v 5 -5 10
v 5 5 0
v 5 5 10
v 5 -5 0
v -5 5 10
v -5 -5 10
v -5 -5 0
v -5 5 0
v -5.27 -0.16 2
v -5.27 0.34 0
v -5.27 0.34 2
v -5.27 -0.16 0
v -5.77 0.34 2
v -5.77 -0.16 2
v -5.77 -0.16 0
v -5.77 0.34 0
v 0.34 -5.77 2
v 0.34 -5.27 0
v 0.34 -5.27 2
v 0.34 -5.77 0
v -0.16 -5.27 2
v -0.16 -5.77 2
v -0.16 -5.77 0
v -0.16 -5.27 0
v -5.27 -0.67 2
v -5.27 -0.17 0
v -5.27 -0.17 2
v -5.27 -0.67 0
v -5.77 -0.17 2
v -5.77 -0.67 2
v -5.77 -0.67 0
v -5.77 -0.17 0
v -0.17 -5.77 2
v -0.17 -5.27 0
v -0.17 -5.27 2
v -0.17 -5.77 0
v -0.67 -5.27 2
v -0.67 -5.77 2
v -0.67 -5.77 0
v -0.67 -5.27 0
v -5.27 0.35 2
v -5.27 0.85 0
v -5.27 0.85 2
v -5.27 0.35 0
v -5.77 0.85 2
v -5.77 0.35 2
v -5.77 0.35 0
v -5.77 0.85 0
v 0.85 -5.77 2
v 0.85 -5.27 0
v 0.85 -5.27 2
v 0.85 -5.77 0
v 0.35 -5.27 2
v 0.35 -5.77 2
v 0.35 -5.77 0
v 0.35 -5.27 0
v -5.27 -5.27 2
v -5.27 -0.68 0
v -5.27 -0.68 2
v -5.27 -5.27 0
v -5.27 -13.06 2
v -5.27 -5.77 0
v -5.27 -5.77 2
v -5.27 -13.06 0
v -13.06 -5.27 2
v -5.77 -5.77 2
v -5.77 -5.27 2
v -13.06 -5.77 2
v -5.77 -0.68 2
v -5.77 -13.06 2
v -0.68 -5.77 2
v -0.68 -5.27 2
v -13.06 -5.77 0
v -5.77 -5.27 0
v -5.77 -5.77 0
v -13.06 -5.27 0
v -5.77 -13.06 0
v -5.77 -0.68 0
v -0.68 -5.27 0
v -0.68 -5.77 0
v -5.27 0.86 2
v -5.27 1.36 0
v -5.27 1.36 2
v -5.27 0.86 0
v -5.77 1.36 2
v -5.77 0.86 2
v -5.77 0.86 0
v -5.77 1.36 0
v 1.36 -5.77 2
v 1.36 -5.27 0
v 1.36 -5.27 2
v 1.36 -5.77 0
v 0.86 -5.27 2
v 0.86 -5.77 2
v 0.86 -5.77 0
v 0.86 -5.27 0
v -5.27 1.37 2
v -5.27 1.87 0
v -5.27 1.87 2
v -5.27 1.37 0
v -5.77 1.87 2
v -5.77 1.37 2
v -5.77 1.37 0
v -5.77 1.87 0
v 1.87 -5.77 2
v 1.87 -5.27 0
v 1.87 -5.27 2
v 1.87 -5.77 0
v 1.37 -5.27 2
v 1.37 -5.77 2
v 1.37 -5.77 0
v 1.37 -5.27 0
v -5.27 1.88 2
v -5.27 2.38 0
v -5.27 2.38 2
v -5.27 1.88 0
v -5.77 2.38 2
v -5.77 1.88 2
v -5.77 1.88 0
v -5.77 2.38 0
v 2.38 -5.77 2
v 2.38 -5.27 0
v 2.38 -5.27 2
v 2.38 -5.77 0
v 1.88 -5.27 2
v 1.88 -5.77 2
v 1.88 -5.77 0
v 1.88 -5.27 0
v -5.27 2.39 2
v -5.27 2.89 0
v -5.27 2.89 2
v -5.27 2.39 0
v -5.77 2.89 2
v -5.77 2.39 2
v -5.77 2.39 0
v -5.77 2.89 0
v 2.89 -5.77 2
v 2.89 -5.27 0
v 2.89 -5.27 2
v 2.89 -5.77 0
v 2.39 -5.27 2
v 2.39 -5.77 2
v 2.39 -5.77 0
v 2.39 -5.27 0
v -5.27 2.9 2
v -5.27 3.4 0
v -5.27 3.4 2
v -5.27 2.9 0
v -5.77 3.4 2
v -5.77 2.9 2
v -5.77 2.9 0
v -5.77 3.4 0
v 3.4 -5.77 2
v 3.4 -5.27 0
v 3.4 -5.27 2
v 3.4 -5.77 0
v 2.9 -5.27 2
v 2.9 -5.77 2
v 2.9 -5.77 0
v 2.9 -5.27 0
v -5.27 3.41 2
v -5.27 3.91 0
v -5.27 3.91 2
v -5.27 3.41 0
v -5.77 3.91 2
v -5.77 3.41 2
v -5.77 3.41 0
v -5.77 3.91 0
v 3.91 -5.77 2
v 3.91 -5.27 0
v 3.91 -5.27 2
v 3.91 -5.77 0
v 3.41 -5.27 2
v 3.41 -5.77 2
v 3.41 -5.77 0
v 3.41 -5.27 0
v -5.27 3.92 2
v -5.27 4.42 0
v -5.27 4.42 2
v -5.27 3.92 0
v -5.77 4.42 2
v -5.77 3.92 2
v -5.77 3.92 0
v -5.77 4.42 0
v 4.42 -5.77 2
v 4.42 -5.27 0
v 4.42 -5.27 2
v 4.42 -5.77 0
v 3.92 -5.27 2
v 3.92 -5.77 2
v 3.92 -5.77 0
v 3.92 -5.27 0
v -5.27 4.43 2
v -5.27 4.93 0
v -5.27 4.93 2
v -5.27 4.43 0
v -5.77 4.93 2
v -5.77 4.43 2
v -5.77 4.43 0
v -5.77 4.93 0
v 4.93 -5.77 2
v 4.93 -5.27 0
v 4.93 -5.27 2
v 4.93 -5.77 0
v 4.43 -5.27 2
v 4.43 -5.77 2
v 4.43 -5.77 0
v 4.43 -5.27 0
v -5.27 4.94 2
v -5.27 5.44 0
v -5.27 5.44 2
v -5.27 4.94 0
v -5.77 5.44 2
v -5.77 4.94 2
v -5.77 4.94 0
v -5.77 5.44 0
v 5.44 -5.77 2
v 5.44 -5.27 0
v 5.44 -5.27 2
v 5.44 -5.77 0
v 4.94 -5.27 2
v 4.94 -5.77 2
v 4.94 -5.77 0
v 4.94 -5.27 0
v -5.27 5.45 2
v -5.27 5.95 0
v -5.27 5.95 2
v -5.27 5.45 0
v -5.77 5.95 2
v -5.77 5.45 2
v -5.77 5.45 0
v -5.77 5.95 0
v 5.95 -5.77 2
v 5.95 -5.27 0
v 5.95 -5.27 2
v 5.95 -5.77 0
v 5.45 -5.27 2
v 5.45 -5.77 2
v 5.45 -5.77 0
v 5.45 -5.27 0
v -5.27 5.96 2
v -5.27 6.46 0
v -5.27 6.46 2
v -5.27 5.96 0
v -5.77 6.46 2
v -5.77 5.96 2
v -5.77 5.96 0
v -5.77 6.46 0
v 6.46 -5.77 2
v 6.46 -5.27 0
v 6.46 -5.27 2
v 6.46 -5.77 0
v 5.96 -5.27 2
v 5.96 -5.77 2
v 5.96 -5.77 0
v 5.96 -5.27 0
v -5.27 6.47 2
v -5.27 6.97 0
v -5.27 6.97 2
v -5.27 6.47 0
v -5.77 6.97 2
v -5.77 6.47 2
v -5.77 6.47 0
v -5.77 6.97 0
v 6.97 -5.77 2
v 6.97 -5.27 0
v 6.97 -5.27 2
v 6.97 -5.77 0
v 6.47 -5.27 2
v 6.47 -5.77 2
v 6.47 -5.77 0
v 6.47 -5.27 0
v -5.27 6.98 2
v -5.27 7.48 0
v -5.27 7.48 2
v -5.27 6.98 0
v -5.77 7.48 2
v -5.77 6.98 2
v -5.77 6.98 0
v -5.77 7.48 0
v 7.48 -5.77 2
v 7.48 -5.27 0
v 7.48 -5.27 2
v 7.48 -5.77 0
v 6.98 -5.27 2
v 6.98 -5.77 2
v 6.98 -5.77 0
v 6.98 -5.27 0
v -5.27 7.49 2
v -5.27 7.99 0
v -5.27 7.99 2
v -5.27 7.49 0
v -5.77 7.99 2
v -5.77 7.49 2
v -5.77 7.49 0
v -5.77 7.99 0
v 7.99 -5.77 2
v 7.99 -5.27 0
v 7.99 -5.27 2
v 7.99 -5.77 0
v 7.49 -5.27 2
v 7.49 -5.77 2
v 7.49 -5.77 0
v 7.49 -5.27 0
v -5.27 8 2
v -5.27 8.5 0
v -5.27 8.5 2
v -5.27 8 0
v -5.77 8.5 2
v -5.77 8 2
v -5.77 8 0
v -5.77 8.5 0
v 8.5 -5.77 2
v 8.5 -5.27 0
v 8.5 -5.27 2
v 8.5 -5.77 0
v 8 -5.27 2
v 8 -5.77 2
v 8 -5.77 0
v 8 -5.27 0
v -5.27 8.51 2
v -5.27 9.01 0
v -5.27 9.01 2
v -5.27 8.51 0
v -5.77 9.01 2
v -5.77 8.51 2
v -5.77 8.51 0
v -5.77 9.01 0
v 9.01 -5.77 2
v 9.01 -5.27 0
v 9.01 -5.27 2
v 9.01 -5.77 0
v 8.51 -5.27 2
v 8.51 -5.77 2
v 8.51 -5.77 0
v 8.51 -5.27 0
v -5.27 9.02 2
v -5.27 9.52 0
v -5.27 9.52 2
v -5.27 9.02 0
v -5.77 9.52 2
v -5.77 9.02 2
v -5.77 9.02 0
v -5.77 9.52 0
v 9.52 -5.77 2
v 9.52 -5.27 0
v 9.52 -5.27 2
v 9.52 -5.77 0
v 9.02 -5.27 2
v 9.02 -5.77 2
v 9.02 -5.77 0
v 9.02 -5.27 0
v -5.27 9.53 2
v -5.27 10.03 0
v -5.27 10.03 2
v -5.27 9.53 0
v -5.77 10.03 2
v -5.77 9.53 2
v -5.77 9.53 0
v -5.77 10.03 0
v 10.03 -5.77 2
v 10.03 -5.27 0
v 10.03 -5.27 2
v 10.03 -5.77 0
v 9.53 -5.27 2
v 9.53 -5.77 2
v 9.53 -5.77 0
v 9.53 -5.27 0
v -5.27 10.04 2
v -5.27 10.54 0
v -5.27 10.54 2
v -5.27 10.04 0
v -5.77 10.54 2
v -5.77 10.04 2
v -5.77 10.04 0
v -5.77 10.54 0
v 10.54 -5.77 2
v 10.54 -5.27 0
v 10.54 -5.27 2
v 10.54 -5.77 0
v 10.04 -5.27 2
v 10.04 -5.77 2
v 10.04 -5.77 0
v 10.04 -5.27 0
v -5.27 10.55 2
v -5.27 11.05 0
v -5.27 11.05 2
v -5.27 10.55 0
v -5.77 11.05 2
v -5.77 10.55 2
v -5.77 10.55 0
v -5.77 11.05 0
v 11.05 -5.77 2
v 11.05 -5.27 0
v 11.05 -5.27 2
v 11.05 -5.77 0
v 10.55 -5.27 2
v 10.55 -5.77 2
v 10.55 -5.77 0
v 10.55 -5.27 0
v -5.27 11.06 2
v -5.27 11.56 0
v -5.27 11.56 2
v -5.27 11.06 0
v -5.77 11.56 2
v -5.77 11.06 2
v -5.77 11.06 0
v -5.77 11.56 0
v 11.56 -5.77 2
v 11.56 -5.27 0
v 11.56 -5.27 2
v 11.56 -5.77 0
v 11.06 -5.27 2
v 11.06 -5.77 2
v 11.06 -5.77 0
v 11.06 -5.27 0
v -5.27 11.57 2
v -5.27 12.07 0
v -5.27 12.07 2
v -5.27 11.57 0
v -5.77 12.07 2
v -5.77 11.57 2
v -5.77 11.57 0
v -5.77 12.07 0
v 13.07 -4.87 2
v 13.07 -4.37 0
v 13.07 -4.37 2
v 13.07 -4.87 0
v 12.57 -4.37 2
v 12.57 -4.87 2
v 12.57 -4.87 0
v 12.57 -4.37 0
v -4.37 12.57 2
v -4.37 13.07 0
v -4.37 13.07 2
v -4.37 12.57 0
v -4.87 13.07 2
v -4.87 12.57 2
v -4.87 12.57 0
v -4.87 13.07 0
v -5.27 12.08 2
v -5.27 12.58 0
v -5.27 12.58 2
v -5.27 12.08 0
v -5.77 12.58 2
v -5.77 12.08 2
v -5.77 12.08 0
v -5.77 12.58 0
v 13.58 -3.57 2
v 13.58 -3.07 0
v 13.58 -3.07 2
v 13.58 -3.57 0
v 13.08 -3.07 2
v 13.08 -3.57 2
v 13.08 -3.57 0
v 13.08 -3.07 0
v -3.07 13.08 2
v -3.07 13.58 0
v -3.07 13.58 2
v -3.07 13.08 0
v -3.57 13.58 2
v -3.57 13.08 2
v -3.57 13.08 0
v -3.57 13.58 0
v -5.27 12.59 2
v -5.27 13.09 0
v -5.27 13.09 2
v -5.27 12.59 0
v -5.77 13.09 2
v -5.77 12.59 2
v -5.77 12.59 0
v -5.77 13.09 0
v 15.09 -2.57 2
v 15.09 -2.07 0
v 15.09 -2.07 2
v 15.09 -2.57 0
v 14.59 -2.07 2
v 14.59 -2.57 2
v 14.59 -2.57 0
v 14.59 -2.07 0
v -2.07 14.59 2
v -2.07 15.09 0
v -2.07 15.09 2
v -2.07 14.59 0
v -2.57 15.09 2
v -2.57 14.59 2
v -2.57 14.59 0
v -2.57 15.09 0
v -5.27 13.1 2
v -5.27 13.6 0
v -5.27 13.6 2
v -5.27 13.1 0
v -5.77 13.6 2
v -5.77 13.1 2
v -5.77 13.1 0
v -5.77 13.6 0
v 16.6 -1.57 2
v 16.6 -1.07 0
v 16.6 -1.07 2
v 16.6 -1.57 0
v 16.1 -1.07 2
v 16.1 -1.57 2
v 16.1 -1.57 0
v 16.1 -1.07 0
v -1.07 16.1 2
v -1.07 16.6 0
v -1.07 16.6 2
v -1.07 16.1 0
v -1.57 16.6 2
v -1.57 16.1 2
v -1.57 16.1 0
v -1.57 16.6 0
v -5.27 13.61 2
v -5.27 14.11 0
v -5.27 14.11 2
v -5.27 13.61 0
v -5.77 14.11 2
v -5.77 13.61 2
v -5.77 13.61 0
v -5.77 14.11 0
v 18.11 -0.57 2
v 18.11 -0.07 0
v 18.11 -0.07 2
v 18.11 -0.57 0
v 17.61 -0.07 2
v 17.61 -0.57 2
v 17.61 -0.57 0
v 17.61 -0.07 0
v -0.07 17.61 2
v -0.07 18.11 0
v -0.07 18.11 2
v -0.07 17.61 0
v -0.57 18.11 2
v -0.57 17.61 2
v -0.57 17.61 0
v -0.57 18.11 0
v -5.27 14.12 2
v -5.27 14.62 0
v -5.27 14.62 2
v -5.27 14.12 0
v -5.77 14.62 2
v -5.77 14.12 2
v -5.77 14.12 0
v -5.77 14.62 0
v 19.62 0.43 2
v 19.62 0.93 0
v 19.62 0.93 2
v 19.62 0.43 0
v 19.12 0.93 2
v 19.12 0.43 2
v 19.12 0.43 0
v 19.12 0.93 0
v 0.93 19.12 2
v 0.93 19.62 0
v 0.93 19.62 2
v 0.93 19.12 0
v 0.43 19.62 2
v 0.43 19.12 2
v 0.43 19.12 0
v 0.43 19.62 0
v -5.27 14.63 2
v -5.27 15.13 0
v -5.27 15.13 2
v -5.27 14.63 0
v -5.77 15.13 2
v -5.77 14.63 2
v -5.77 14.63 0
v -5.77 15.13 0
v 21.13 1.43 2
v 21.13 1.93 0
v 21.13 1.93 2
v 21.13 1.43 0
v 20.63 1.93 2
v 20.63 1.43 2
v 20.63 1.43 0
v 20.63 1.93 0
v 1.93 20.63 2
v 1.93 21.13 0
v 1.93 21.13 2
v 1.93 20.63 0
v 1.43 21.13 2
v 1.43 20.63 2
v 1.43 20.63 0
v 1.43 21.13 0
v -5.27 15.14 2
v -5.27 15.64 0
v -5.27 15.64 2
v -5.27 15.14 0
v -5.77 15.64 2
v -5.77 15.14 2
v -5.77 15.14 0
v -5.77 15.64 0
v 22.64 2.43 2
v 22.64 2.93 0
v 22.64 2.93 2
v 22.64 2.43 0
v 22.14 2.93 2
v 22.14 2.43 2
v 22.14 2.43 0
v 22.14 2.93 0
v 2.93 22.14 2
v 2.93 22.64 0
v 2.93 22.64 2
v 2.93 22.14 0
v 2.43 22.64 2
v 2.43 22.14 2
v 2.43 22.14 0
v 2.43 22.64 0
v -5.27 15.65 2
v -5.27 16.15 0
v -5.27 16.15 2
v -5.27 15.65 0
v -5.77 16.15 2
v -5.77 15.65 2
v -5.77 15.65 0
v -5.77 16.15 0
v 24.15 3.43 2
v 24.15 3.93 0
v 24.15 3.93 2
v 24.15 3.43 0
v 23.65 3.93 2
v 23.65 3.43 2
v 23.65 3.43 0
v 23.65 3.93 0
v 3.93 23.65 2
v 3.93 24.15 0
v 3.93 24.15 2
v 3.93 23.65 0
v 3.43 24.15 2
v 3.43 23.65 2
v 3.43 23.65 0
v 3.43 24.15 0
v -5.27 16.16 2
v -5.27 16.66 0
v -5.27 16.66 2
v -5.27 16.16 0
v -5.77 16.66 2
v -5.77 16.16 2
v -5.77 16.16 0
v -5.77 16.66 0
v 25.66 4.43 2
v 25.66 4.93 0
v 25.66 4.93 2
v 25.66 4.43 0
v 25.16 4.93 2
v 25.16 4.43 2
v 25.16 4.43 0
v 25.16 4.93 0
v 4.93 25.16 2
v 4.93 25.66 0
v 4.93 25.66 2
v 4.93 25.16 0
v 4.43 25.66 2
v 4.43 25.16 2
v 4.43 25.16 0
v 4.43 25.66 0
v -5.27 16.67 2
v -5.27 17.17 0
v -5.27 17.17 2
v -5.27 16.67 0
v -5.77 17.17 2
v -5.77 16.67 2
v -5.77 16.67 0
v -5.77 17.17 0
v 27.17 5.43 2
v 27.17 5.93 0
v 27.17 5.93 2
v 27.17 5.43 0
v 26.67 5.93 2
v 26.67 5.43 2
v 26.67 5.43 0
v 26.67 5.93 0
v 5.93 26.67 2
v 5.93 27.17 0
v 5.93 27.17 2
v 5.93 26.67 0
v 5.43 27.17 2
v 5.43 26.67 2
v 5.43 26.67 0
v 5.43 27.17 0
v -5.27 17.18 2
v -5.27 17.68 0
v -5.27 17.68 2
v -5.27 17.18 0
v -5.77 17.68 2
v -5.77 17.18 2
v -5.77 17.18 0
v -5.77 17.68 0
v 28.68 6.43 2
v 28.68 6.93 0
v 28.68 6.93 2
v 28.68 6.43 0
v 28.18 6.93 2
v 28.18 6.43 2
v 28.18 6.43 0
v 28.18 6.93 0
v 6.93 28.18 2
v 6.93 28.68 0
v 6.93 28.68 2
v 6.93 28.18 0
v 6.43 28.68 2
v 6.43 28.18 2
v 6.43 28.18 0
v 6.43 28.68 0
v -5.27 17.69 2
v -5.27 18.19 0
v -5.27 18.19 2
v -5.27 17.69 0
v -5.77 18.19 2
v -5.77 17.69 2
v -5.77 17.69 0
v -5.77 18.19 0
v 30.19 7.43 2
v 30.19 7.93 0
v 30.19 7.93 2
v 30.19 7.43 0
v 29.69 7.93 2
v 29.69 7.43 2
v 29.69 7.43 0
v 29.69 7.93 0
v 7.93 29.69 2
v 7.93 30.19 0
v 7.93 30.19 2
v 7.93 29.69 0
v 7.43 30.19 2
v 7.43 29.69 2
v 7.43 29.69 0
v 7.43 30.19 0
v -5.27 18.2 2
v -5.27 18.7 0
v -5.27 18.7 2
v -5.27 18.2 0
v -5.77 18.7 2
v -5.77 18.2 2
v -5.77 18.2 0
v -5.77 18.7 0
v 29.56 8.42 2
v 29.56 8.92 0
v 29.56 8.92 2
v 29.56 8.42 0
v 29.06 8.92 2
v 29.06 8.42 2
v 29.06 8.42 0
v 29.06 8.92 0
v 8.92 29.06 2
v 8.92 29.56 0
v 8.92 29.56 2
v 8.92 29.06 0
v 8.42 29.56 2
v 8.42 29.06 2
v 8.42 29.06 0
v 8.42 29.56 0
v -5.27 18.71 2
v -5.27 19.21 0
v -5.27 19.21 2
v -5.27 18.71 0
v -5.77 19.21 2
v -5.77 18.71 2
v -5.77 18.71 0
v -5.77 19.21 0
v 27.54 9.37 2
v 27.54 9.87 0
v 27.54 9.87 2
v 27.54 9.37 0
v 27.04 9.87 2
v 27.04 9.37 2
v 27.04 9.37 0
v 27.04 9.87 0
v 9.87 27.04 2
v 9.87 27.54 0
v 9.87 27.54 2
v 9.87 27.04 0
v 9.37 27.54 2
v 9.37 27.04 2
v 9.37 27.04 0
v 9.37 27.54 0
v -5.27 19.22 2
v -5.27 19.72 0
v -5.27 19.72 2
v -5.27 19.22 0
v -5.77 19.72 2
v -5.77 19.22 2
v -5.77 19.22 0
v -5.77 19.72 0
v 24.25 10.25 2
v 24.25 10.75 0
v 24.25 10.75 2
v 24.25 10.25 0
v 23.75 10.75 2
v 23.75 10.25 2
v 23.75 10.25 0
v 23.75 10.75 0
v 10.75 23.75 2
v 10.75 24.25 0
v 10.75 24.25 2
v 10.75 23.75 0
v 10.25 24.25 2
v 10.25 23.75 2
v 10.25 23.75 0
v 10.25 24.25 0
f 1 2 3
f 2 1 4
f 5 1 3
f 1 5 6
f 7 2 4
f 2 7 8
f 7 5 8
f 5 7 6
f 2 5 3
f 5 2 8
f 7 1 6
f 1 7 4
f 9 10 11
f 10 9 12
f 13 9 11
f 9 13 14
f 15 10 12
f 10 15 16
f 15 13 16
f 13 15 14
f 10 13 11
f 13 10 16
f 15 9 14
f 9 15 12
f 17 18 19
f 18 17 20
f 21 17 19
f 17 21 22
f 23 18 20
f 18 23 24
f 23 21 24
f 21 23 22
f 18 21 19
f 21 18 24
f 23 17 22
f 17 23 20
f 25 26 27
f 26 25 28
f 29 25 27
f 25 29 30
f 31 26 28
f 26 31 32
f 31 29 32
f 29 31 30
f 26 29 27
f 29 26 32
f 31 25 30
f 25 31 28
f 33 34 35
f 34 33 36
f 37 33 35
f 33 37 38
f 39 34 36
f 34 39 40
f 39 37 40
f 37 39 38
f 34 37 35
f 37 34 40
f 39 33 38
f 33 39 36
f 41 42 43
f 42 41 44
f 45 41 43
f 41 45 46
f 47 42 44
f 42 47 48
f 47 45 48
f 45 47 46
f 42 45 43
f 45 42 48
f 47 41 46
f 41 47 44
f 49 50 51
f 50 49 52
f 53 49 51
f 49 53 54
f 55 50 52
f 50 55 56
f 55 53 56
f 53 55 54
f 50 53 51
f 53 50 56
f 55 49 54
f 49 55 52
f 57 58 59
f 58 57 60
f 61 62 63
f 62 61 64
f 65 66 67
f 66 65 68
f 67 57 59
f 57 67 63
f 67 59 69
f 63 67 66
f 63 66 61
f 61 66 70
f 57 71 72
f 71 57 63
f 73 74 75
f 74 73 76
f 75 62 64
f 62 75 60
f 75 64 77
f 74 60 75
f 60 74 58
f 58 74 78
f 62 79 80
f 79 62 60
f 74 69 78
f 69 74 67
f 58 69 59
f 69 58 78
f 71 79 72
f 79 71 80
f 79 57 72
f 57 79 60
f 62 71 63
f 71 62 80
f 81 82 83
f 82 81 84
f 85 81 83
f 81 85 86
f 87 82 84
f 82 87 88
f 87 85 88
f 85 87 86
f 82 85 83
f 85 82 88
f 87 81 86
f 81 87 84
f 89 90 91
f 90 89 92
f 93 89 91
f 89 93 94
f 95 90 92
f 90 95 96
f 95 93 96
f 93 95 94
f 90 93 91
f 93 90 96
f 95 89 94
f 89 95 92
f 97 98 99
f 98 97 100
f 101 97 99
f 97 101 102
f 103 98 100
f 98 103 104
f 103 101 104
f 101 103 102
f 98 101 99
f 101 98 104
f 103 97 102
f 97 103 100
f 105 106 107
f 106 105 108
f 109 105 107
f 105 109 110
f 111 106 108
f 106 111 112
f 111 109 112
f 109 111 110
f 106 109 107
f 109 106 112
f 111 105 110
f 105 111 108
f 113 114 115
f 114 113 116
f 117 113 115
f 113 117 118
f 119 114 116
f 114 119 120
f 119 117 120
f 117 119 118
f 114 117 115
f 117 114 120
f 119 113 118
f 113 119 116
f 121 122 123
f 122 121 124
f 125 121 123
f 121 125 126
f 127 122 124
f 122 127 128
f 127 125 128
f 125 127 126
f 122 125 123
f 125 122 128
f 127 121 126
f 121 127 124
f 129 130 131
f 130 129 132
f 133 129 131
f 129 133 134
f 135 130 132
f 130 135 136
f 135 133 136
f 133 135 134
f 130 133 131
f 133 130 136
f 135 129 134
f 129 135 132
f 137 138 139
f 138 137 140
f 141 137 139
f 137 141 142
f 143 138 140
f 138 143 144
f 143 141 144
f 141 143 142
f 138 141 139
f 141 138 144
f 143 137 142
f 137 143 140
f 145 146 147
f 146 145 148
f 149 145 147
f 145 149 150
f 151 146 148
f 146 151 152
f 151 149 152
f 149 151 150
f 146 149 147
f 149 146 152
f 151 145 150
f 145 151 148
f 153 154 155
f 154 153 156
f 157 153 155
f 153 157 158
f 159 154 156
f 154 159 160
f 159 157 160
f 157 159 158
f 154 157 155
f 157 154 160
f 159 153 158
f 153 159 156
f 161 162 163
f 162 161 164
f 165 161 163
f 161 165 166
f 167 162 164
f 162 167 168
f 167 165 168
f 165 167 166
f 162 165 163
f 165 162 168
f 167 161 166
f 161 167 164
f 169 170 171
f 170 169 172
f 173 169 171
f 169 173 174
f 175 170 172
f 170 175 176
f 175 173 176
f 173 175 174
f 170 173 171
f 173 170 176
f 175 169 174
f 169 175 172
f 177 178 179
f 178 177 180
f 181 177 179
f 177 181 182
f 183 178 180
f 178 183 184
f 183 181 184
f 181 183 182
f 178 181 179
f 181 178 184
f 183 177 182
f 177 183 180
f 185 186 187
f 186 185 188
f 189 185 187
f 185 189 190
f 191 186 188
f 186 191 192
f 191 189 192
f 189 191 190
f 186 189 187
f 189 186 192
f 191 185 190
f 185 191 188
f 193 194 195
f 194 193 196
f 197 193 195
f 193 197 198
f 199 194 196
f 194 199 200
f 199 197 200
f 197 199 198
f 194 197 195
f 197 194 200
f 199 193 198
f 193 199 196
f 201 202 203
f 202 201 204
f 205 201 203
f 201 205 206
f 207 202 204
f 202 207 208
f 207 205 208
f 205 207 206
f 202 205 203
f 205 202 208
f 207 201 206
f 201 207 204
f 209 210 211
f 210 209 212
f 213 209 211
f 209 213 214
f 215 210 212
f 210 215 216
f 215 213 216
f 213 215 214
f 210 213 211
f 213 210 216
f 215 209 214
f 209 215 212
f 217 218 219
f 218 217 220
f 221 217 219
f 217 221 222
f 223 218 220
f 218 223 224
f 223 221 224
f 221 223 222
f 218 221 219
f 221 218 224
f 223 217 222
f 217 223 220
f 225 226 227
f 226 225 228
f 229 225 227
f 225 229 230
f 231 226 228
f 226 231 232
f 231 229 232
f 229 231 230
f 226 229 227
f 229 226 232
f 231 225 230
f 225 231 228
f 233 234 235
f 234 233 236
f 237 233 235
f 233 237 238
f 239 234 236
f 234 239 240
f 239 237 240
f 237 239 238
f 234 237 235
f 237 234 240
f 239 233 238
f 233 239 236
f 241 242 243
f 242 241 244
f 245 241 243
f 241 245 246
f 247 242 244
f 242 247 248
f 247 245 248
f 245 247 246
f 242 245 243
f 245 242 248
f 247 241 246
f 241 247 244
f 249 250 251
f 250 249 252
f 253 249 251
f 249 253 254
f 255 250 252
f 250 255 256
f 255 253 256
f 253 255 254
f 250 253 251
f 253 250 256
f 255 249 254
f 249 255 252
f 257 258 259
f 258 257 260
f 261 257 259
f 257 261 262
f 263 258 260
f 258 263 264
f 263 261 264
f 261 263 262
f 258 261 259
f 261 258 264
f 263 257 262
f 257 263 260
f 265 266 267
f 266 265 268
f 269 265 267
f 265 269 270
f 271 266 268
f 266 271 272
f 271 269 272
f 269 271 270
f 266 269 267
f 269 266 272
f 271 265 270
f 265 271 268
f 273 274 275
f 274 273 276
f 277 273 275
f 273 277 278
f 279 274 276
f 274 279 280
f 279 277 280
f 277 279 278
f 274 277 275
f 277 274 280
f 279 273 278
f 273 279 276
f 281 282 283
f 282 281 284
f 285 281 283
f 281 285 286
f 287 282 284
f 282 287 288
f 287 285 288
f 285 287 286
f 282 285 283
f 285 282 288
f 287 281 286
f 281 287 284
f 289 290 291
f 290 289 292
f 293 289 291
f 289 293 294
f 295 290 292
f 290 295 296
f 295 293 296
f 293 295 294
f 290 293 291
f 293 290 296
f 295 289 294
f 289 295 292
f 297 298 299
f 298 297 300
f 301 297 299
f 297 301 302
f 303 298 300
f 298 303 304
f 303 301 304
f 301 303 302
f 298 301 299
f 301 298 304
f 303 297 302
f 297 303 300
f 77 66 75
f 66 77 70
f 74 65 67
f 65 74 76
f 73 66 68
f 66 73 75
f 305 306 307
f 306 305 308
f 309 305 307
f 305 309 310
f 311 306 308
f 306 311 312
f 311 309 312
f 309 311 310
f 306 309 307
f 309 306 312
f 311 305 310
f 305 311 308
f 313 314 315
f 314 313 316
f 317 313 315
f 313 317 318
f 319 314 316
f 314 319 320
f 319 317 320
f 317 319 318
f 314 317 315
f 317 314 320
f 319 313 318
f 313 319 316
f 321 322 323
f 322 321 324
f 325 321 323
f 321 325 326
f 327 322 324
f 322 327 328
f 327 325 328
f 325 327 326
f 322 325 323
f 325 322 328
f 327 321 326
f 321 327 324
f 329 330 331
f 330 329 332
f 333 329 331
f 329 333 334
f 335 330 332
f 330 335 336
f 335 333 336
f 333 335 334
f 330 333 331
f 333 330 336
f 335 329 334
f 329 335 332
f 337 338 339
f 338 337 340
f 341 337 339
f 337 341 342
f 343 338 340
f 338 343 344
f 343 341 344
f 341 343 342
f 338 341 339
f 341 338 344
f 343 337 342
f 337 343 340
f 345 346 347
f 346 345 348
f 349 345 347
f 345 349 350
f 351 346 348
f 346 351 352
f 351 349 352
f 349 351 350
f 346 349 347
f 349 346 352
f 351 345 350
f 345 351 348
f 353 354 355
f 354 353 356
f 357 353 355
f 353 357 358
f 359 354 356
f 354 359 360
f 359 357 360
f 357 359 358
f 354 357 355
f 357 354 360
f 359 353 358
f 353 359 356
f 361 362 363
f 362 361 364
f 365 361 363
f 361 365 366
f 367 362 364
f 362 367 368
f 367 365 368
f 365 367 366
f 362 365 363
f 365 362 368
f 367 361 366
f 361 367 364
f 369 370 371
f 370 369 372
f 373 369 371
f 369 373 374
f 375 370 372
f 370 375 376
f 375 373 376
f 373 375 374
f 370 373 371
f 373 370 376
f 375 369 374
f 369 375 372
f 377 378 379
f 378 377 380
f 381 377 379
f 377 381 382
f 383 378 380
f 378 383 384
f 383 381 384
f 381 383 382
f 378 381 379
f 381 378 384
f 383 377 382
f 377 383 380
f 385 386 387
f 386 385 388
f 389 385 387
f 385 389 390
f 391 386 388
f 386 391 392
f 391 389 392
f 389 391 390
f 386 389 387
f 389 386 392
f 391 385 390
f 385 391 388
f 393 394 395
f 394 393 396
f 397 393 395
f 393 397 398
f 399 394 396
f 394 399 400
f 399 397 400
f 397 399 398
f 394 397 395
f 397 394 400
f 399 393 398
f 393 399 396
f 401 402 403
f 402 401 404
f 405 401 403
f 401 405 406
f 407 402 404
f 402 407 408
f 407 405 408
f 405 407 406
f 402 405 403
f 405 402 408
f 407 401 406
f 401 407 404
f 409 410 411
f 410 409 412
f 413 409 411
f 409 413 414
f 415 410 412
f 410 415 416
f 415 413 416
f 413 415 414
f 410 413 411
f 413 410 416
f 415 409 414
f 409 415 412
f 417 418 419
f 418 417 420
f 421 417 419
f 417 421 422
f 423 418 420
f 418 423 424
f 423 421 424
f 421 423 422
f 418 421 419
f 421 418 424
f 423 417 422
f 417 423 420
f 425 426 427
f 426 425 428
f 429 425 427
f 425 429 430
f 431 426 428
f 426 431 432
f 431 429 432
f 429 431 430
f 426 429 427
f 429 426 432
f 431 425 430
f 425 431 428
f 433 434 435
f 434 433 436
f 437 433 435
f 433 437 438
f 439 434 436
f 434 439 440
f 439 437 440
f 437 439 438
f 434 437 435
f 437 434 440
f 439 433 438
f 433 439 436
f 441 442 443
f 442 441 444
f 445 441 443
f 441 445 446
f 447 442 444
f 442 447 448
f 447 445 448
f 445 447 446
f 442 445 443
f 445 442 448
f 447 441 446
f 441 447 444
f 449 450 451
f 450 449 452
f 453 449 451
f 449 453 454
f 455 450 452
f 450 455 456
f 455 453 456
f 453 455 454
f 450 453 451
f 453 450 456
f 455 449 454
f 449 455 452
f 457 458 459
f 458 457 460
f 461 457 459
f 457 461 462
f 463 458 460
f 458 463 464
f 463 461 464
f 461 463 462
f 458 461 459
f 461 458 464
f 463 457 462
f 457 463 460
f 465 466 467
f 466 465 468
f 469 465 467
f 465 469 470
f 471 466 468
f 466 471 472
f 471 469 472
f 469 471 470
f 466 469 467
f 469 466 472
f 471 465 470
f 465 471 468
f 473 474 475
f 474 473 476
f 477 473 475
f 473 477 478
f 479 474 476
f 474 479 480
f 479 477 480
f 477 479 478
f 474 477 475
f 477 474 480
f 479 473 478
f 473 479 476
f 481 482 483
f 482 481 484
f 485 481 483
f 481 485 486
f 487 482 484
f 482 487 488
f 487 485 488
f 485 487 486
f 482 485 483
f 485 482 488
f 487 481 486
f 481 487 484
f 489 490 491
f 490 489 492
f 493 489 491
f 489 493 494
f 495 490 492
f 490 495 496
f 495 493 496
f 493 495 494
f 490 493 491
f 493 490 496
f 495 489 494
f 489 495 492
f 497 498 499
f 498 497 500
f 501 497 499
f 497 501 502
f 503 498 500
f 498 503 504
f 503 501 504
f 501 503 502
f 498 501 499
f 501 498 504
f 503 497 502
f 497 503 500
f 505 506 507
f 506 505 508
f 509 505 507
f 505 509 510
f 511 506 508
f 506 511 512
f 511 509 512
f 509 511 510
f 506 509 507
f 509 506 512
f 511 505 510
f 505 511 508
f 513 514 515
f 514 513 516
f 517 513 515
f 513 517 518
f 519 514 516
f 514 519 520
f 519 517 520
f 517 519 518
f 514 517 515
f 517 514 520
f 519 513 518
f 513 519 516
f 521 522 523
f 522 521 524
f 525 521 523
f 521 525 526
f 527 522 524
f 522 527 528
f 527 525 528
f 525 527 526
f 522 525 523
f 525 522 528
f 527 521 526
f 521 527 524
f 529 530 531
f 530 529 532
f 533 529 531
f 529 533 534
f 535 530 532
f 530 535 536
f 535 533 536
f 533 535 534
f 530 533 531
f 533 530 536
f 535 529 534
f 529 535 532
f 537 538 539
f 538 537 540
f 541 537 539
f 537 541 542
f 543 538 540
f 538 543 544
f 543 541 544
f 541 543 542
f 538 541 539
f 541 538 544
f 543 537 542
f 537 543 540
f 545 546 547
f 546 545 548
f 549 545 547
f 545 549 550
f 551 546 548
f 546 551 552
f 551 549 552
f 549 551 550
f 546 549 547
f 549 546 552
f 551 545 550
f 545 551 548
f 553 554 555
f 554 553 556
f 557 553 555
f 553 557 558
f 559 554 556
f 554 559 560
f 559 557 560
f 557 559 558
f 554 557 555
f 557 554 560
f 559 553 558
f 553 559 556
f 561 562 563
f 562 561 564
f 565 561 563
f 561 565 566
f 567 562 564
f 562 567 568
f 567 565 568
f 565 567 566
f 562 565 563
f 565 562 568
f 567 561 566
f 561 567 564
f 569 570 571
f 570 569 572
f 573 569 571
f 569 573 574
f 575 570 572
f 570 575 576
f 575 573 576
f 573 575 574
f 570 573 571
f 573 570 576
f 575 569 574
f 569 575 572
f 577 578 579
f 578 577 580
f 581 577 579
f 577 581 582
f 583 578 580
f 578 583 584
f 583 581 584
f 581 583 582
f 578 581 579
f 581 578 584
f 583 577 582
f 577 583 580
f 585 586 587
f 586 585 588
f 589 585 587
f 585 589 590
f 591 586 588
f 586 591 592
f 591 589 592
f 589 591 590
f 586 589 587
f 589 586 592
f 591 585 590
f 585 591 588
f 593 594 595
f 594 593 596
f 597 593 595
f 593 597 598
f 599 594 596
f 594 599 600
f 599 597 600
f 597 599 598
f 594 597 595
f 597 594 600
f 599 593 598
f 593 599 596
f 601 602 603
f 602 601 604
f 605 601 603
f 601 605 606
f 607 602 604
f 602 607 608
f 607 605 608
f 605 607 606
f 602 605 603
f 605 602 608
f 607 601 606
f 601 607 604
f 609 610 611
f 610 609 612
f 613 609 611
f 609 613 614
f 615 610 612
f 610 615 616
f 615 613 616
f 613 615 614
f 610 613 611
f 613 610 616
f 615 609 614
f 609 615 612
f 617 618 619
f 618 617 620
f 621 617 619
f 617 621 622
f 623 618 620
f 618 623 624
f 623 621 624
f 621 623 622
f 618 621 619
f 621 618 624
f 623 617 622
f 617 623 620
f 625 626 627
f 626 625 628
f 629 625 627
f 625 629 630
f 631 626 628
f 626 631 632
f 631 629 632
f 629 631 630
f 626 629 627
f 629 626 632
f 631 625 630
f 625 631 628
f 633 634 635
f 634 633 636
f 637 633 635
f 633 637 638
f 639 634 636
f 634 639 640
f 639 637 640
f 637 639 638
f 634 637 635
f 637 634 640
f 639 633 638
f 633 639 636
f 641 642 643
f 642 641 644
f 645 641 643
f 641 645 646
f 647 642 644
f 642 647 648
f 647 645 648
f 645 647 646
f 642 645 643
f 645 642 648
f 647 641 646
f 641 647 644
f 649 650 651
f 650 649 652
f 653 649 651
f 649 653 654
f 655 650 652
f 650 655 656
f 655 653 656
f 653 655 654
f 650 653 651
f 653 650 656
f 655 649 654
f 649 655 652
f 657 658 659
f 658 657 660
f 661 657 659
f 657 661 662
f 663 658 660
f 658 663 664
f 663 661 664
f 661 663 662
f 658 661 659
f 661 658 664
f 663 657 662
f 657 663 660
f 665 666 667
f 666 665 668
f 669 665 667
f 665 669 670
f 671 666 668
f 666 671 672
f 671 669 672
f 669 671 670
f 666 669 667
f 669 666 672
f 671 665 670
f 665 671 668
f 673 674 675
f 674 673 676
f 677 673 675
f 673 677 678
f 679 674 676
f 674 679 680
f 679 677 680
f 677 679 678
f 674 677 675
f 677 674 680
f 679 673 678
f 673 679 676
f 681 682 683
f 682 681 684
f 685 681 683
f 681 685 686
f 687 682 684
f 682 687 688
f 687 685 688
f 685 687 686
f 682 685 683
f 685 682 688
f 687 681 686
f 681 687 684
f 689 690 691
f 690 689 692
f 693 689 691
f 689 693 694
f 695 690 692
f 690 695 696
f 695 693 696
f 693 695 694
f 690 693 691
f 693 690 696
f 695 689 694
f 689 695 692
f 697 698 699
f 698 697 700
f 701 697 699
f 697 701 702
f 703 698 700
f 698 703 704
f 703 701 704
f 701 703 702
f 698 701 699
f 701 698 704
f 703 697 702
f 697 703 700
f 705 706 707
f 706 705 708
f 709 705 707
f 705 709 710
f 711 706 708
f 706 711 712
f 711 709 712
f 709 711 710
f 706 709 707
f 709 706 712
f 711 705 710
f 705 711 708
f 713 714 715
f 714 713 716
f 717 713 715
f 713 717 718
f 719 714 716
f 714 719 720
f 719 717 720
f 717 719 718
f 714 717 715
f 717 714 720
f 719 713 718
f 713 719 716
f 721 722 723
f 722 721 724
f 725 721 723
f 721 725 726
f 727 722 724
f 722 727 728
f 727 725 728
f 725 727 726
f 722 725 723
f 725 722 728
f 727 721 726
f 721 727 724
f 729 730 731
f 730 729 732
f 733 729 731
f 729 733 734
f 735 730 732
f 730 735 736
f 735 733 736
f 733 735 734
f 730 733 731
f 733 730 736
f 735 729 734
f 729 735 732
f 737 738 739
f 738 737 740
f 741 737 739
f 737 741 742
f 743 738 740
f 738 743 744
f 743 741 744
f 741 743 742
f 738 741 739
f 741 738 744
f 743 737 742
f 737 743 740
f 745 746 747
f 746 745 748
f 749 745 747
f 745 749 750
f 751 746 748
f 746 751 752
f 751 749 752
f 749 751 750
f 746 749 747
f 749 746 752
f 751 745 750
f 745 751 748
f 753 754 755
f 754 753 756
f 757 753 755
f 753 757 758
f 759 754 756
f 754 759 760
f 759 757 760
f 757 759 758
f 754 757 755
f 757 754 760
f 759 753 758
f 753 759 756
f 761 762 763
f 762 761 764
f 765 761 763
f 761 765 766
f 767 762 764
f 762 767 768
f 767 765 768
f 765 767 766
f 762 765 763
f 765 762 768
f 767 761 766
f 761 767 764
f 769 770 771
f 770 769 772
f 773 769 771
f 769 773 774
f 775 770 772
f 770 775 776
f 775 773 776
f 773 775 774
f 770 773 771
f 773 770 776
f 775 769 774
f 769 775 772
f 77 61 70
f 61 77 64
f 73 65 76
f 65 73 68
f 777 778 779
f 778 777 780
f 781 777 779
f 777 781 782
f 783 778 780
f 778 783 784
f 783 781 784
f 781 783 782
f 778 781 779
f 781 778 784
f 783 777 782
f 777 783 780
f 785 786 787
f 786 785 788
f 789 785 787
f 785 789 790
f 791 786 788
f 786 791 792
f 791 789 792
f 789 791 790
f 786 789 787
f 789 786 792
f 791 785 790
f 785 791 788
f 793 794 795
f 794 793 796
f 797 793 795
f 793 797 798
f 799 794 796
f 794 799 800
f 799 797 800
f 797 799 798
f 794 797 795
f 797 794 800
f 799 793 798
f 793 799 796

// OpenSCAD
translate([0, 0, 5]) color([0,1,0,0.9]) cube([10, 10, 10], center=true);
translate([-5.52, 0.09, 1]) color([1,0,0]) cube([0.5, 0.5, 2], center=true);
translate([0.09, -5.52, 1]) color([1,0,0]) cube([0.5, 0.5, 2], center=true);
translate([-5.52, -0.42, 1]) color([1,0,0]) cube([0.5, 0.5, 2], center=true);
translate([-0.42, -5.52, 1]) color([1,0,0]) cube([0.5, 0.5, 2], center=true);
translate([-5.52, 0.6, 1]) color([1,0,0]) cube([0.5, 0.5, 2], center=true);
translate([0.6, -5.52, 1]) color([1,0,0]) cube([0.5, 0.5, 2], center=true);
translate([-5.52, -0.93, 1]) color([1,0,0]) cube([0.5, 0.5, 2], center=true);
translate([-0.93, -5.52, 1]) color([1,0,0]) cube([0.5, 0.5, 2], center=true);
translate([-5.52, 1.11, 1]) color([1,0,0]) cube([0.5, 0.5, 2], center=true);
translate([1.11, -5.52, 1]) color([1,0,0]) cube([0.5, 0.5, 2], center=true);
translate([-5.52, -1.26, 1]) color([1,0,0]) cube([0.5, 0.5, 2], center=true);
translate([-1.26, -5.52, 1]) color([1,0,0]) cube([0.5, 0.5, 2], center=true);
translate([-5.52, 1.62, 1]) color([1,0,0]) cube([0.5, 0.5, 2], center=true);
translate([1.62, -5.52, 1]) color([1,0,0]) cube([0.5, 0.5, 2], center=true);
translate([-5.52, -1.59, 1]) color([1,0,0]) cube([0.5, 0.5, 2], center=true);
translate([-1.59, -5.52, 1]) color([1,0,0]) cube([0.5, 0.5, 2], center=true);
translate([-5.52, 2.13, 1]) color([1,0,0]) cube([0.5, 0.5, 2], center=true);
translate([2.13, -5.52, 1]) color([1,0,0]) cube([0.5, 0.5, 2], center=true);
translate([-5.52, -1.92, 1]) color([1,0,0]) cube([0.5, 0.5, 2], center=true);
translate([-1.92, -5.52, 1]) color([1,0,0]) cube([0.5, 0.5, 2], center=true);
translate([-5.52, 2.64, 1]) color([1,0,0]) cube([0.5, 0.5, 2], center=true);
translate([2.64, -5.52, 1]) color([1,0,0]) cube([0.5, 0.5, 2], center=true);
translate([-5.52, -2.25, 1]) color([1,0,0]) cube([0.5, 0.5, 2], center=true);
translate([-2.25, -5.52, 1]) color([1,0,0]) cube([0.5, 0.5, 2], center=true);
translate([-5.52, 3.15, 1]) color([1,0,0]) cube([0.5, 0.5, 2], center=true);
translate([3.15, -5.52, 1]) color([1,0,0]) cube([0.5, 0.5, 2], center=true);
translate([-5.52, -2.58, 1]) color([1,0,0]) cube([0.5, 0.5, 2], center=true);
translate([-2.58, -5.52, 1]) color([1,0,0]) cube([0.5, 0.5, 2], center=true);
translate([-5.52, 3.66, 1]) color([1,0,0]) cube([0.5, 0.5, 2], center=true);
translate([3.66, -5.52, 1]) color([1,0,0]) cube([0.5, 0.5, 2], center=true);
translate([-5.52, -2.91, 1]) color([1,0,0]) cube([0.5, 0.5, 2], center=true);
translate([-2.91, -5.52, 1]) color([1,0,0]) cube([0.5, 0.5, 2], center=true);
translate([-5.52, 4.17, 1]) color([1,0,0]) cube([0.5, 0.5, 2], center=true);
translate([4.17, -5.52, 1]) color([1,0,0]) cube([0.5, 0.5, 2], center=true);
translate([-5.52, -3.24, 1]) color([1,0,0]) cube([0.5, 0.5, 2], center=true);
translate([-3.24, -5.52, 1]) color([1,0,0]) cube([0.5, 0.5, 2], center=true);
translate([-5.52, 4.68, 1]) color([1,0,0]) cube([0.5, 0.5, 2], center=true);
translate([4.68, -5.52, 1]) color([1,0,0]) cube([0.5, 0.5, 2], center=true);
translate([-5.52, -3.57, 1]) color([1,0,0]) cube([0.5, 0.5, 2], center=true);
translate([-3.57, -5.52, 1]) color([1,0,0]) cube([0.5, 0.5, 2], center=true);
translate([-5.52, 5.19, 1]) color([1,0,0]) cube([0.5, 0.5, 2], center=true);
translate([5.19, -5.52, 1]) color([1,0,0]) cube([0.5, 0.5, 2], center=true);
translate([-5.52, -3.9, 1]) color([1,0,0]) cube([0.5, 0.5, 2], center=true);
translate([-3.9, -5.52, 1]) color([1,0,0]) cube([0.5, 0.5, 2], center=true);
translate([-5.52, 5.7, 1]) color([1,0,0]) cube([0.5, 0.5, 2], center=true);
translate([5.7, -5.52, 1]) color([1,0,0]) cube([0.5, 0.5, 2], center=true);
translate([-5.52, -4.23, 1]) color([1,0,0]) cube([0.5, 0.5, 2], center=true);
translate([-4.23, -5.52, 1]) color([1,0,0]) cube([0.5, 0.5, 2], center=true);
translate([-5.52, 6.21, 1]) color([1,0,0]) cube([0.5, 0.5, 2], center=true);
translate([6.21, -5.52, 1]) color([1,0,0]) cube([0.5, 0.5, 2], center=true);
translate([-5.52, -4.56, 1]) color([1,0,0]) cube([0.5, 0.5, 2], center=true);
translate([-4.56, -5.52, 1]) color([1,0,0]) cube([0.5, 0.5, 2], center=true);
translate([-5.52, 6.72, 1]) color([1,0,0]) cube([0.5, 0.5, 2], center=true);
translate([6.72, -5.52, 1]) color([1,0,0]) cube([0.5, 0.5, 2], center=true);
translate([-5.52, -4.89, 1]) color([1,0,0]) cube([0.5, 0.5, 2], center=true);
translate([-4.89, -5.52, 1]) color([1,0,0]) cube([0.5, 0.5, 2], center=true);
translate([-5.52, 7.23, 1]) color([1,0,0]) cube([0.5, 0.5, 2], center=true);
translate([7.23, -5.52, 1]) color([1,0,0]) cube([0.5, 0.5, 2], center=true);
translate([-5.52, -5.22, 1]) color([1,0,0]) cube([0.5, 0.5, 2], center=true);
translate([-5.22, -5.52, 1]) color([1,0,0]) cube([0.5, 0.5, 2], center=true);
translate([-5.52, 7.74, 1]) color([1,0,0]) cube([0.5, 0.5, 2], center=true);
translate([7.74, -5.52, 1]) color([1,0,0]) cube([0.5, 0.5, 2], center=true);
translate([-5.52, -5.55, 1]) color([1,0,0]) cube([0.5, 0.5, 2], center=true);
translate([-5.55, -5.52, 1]) color([1,0,0]) cube([0.5, 0.5, 2], center=true);
translate([-5.52, 8.25, 1]) color([1,0,0]) cube([0.5, 0.5, 2], center=true);
translate([8.25, -5.52, 1]) color([1,0,0]) cube([0.5, 0.5, 2], center=true);
translate([-5.52, -5.88, 1]) color([1,0,0]) cube([0.5, 0.5, 2], center=true);
translate([-5.88, -5.52, 1]) color([1,0,0]) cube([0.5, 0.5, 2], center=true);
translate([-5.52, 8.76, 1]) color([1,0,0]) cube([0.5, 0.5, 2], center=true);
translate([8.76, -5.52, 1]) color([1,0,0]) cube([0.5, 0.5, 2], center=true);
translate([-5.52, -6.21, 1]) color([1,0,0]) cube([0.5, 0.5, 2], center=true);
translate([-6.21, -5.52, 1]) color([1,0,0]) cube([0.5, 0.5, 2], center=true);
translate([-5.52, 9.27, 1]) color([1,0,0]) cube([0.5, 0.5, 2], center=true);
translate([9.27, -5.52, 1]) color([1,0,0]) cube([0.5, 0.5, 2], center=true);
translate([-5.52, -6.54, 1]) color([1,0,0]) cube([0.5, 0.5, 2], center=true);
translate([-6.54, -5.52, 1]) color([1,0,0]) cube([0.5, 0.5, 2], center=true);
translate([-5.52, 9.78, 1]) color([1,0,0]) cube([0.5, 0.5, 2], center=true);
translate([9.78, -5.52, 1]) color([1,0,0]) cube([0.5, 0.5, 2], center=true);
translate([-5.52, -6.87, 1]) color([1,0,0]) cube([0.5, 0.5, 2], center=true);
translate([-6.87, -5.52, 1]) color([1,0,0]) cube([0.5, 0.5, 2], center=true);
translate([-5.52, 10.29, 1]) color([1,0,0]) cube([0.5, 0.5, 2], center=true);
translate([10.29, -5.52, 1]) color([1,0,0]) cube([0.5, 0.5, 2], center=true);
translate([-5.52, -7.2, 1]) color([1,0,0]) cube([0.5, 0.5, 2], center=true);
translate([-7.2, -5.52, 1]) color([1,0,0]) cube([0.5, 0.5, 2], center=true);
translate([-5.52, 10.8, 1]) color([1,0,0]) cube([0.5, 0.5, 2], center=true);
translate([10.8, -5.52, 1]) color([1,0,0]) cube([0.5, 0.5, 2], center=true);
translate([-5.52, -7.53, 1]) color([1,0,0]) cube([0.5, 0.5, 2], center=true);
translate([-7.53, -5.52, 1]) color([1,0,0]) cube([0.5, 0.5, 2], center=true);
translate([-5.52, 11.31, 1]) color([1,0,0]) cube([0.5, 0.5, 2], center=true);
translate([11.31, -5.52, 1]) color([1,0,0]) cube([0.5, 0.5, 2], center=true);
translate([-5.52, -7.86, 1]) color([1,0,0]) cube([0.5, 0.5, 2], center=true);
translate([-7.86, -5.52, 1]) color([1,0,0]) cube([0.5, 0.5, 2], center=true);
translate([-5.52, 11.82, 1]) color([1,0,0]) cube([0.5, 0.5, 2], center=true);
translate([12.82, -4.62, 1]) color([1,0,0]) cube([0.5, 0.5, 2], center=true);
translate([-4.62, 12.82, 1]) color([1,0,0]) cube([0.5, 0.5, 2], center=true);
translate([-5.52, -8.19, 1]) color([1,0,0]) cube([0.5, 0.5, 2], center=true);
translate([-8.19, -5.52, 1]) color([1,0,0]) cube([0.5, 0.5, 2], center=true);
translate([-5.52, 12.33, 1]) color([1,0,0]) cube([0.5, 0.5, 2], center=true);
translate([13.33, -3.32, 1]) color([1,0,0]) cube([0.5, 0.5, 2], center=true);
translate([-3.32, 13.33, 1]) color([1,0,0]) cube([0.5, 0.5, 2], center=true);
translate([-5.52, -8.52, 1]) color([1,0,0]) cube([0.5, 0.5, 2], center=true);
translate([-8.52, -5.52, 1]) color([1,0,0]) cube([0.5, 0.5, 2], center=true);
translate([-5.52, 12.84, 1]) color([1,0,0]) cube([0.5, 0.5, 2], center=true);
translate([14.84, -2.32, 1]) color([1,0,0]) cube([0.5, 0.5, 2], center=true);
translate([-2.32, 14.84, 1]) color([1,0,0]) cube([0.5, 0.5, 2], center=true);
translate([-5.52, -8.85, 1]) color([1,0,0]) cube([0.5, 0.5, 2], center=true);
translate([-8.85, -5.52, 1]) color([1,0,0]) cube([0.5, 0.5, 2], center=true);
translate([-5.52, 13.35, 1]) color([1,0,0]) cube([0.5, 0.5, 2], center=true);
translate([16.35, -1.32, 1]) color([1,0,0]) cube([0.5, 0.5, 2], center=true);
translate([-1.32, 16.35, 1]) color([1,0,0]) cube([0.5, 0.5, 2], center=true);
translate([-5.52, -9.18, 1]) color([1,0,0]) cube([0.5, 0.5, 2], center=true);
translate([-9.18, -5.52, 1]) color([1,0,0]) cube([0.5, 0.5, 2], center=true);
translate([-5.52, 13.86, 1]) color([1,0,0]) cube([0.5, 0.5, 2], center=true);
translate([17.86, -0.32, 1]) color([1,0,0]) cube([0.5, 0.5, 2], center=true);
translate([-0.32, 17.86, 1]) color([1,0,0]) cube([0.5, 0.5, 2], center=true);
translate([-5.52, -9.51, 1]) color([1,0,0]) cube([0.5, 0.5, 2], center=true);
translate([-9.51, -5.52, 1]) color([1,0,0]) cube([0.5, 0.5, 2], center=true);
translate([-5.52, 14.37, 1]) color([1,0,0]) cube([0.5, 0.5, 2], center=true);
translate([19.37, 0.68, 1]) color([1,0,0]) cube([0.5, 0.5, 2], center=true);
translate([0.68, 19.37, 1]) color([1,0,0]) cube([0.5, 0.5, 2], center=true);
translate([-5.52, -9.84, 1]) color([1,0,0]) cube([0.5, 0.5, 2], center=true);
translate([-9.84, -5.52, 1]) color([1,0,0]) cube([0.5, 0.5, 2], center=true);
translate([-5.52, 14.88, 1]) color([1,0,0]) cube([0.5, 0.5, 2], center=true);
translate([20.88, 1.68, 1]) color([1,0,0]) cube([0.5, 0.5, 2], center=true);
translate([1.68, 20.88, 1]) color([1,0,0]) cube([0.5, 0.5, 2], center=true);
translate([-5.52, -10.17, 1]) color([1,0,0]) cube([0.5, 0.5, 2], center=true);
translate([-10.17, -5.52, 1]) color([1,0,0]) cube([0.5, 0.5, 2], center=true);
translate([-5.52, 15.39, 1]) color([1,0,0]) cube([0.5, 0.5, 2], center=true);
translate([22.39, 2.68, 1]) color([1,0,0]) cube([0.5, 0.5, 2], center=true);
translate([2.68, 22.39, 1]) color([1,0,0]) cube([0.5, 0.5, 2], center=true);
translate([-5.52, -10.5, 1]) color([1,0,0]) cube([0.5, 0.5, 2], center=true);
translate([-10.5, -5.52, 1]) color([1,0,0]) cube([0.5, 0.5, 2], center=true);
translate([-5.52, 15.9, 1]) color([1,0,0]) cube([0.5, 0.5, 2], center=true);
translate([23.9, 3.68, 1]) color([1,0,0]) cube([0.5, 0.5, 2], center=true);
translate([3.68, 23.9, 1]) color([1,0,0]) cube([0.5, 0.5, 2], center=true);
translate([-5.52, -10.83, 1]) color([1,0,0]) cube([0.5, 0.5, 2], center=true);
translate([-10.83, -5.52, 1]) color([1,0,0]) cube([0.5, 0.5, 2], center=true);
translate([-5.52, 16.41, 1]) color([1,0,0]) cube([0.5, 0.5, 2], center=true);
translate([25.41, 4.68, 1]) color([1,0,0]) cube([0.5, 0.5, 2], center=true);
translate([4.68, 25.41, 1]) color([1,0,0]) cube([0.5, 0.5, 2], center=true);
translate([-5.52, -11.16, 1]) color([1,0,0]) cube([0.5, 0.5, 2], center=true);
translate([-11.16, -5.52, 1]) color([1,0,0]) cube([0.5, 0.5, 2], center=true);
translate([-5.52, 16.92, 1]) color([1,0,0]) cube([0.5, 0.5, 2], center=true);
translate([26.92, 5.68, 1]) color([1,0,0]) cube([0.5, 0.5, 2], center=true);
translate([5.68, 26.92, 1]) color([1,0,0]) cube([0.5, 0.5, 2], center=true);
translate([-5.52, -11.49, 1]) color([1,0,0]) cube([0.5, 0.5, 2], center=true);
translate([-11.49, -5.52, 1]) color([1,0,0]) cube([0.5, 0.5, 2], center=true);
translate([-5.52, 17.43, 1]) color([1,0,0]) cube([0.5, 0.5, 2], center=true);
translate([28.43, 6.68, 1]) color([1,0,0]) cube([0.5, 0.5, 2], center=true);
translate([6.68, 28.43, 1]) color([1,0,0]) cube([0.5, 0.5, 2], center=true);
translate([-5.52, -11.82, 1]) color([1,0,0]) cube([0.5, 0.5, 2], center=true);
translate([-11.82, -5.52, 1]) color([1,0,0]) cube([0.5, 0.5, 2], center=true);
translate([-5.52, 17.94, 1]) color([1,0,0]) cube([0.5, 0.5, 2], center=true);
translate([29.94, 7.68, 1]) color([1,0,0]) cube([0.5, 0.5, 2], center=true);
translate([7.68, 29.94, 1]) color([1,0,0]) cube([0.5, 0.5, 2], center=true);
translate([-5.52, -12.15, 1]) color([1,0,0]) cube([0.5, 0.5, 2], center=true);
translate([-12.15, -5.52, 1]) color([1,0,0]) cube([0.5, 0.5, 2], center=true);
translate([-5.52, 18.45, 1]) color([1,0,0]) cube([0.5, 0.5, 2], center=true);
translate([29.31, 8.67, 1]) color([1,0,0]) cube([0.5, 0.5, 2], center=true);
translate([8.67, 29.31, 1]) color([1,0,0]) cube([0.5, 0.5, 2], center=true);
translate([-5.52, -12.48, 1]) color([1,0,0]) cube([0.5, 0.5, 2], center=true);
translate([-12.48, -5.52, 1]) color([1,0,0]) cube([0.5, 0.5, 2], center=true);
translate([-5.52, 18.96, 1]) color([1,0,0]) cube([0.5, 0.5, 2], center=true);
translate([27.29, 9.62, 1]) color([1,0,0]) cube([0.5, 0.5, 2], center=true);
translate([9.62, 27.29, 1]) color([1,0,0]) cube([0.5, 0.5, 2], center=true);
translate([-5.52, -12.81, 1]) color([1,0,0]) cube([0.5, 0.5, 2], center=true);
translate([-12.81, -5.52, 1]) color([1,0,0]) cube([0.5, 0.5, 2], center=true);
translate([-5.52, 19.47, 1]) color([1,0,0]) cube([0.5, 0.5, 2], center=true);
translate([24.0, 10.5, 1]) color([1,0,0]) cube([0.5, 0.5, 2], center=true);
translate([10.5, 24.0, 1]) color([1,0,0]) cube([0.5, 0.5, 2], center=true);
